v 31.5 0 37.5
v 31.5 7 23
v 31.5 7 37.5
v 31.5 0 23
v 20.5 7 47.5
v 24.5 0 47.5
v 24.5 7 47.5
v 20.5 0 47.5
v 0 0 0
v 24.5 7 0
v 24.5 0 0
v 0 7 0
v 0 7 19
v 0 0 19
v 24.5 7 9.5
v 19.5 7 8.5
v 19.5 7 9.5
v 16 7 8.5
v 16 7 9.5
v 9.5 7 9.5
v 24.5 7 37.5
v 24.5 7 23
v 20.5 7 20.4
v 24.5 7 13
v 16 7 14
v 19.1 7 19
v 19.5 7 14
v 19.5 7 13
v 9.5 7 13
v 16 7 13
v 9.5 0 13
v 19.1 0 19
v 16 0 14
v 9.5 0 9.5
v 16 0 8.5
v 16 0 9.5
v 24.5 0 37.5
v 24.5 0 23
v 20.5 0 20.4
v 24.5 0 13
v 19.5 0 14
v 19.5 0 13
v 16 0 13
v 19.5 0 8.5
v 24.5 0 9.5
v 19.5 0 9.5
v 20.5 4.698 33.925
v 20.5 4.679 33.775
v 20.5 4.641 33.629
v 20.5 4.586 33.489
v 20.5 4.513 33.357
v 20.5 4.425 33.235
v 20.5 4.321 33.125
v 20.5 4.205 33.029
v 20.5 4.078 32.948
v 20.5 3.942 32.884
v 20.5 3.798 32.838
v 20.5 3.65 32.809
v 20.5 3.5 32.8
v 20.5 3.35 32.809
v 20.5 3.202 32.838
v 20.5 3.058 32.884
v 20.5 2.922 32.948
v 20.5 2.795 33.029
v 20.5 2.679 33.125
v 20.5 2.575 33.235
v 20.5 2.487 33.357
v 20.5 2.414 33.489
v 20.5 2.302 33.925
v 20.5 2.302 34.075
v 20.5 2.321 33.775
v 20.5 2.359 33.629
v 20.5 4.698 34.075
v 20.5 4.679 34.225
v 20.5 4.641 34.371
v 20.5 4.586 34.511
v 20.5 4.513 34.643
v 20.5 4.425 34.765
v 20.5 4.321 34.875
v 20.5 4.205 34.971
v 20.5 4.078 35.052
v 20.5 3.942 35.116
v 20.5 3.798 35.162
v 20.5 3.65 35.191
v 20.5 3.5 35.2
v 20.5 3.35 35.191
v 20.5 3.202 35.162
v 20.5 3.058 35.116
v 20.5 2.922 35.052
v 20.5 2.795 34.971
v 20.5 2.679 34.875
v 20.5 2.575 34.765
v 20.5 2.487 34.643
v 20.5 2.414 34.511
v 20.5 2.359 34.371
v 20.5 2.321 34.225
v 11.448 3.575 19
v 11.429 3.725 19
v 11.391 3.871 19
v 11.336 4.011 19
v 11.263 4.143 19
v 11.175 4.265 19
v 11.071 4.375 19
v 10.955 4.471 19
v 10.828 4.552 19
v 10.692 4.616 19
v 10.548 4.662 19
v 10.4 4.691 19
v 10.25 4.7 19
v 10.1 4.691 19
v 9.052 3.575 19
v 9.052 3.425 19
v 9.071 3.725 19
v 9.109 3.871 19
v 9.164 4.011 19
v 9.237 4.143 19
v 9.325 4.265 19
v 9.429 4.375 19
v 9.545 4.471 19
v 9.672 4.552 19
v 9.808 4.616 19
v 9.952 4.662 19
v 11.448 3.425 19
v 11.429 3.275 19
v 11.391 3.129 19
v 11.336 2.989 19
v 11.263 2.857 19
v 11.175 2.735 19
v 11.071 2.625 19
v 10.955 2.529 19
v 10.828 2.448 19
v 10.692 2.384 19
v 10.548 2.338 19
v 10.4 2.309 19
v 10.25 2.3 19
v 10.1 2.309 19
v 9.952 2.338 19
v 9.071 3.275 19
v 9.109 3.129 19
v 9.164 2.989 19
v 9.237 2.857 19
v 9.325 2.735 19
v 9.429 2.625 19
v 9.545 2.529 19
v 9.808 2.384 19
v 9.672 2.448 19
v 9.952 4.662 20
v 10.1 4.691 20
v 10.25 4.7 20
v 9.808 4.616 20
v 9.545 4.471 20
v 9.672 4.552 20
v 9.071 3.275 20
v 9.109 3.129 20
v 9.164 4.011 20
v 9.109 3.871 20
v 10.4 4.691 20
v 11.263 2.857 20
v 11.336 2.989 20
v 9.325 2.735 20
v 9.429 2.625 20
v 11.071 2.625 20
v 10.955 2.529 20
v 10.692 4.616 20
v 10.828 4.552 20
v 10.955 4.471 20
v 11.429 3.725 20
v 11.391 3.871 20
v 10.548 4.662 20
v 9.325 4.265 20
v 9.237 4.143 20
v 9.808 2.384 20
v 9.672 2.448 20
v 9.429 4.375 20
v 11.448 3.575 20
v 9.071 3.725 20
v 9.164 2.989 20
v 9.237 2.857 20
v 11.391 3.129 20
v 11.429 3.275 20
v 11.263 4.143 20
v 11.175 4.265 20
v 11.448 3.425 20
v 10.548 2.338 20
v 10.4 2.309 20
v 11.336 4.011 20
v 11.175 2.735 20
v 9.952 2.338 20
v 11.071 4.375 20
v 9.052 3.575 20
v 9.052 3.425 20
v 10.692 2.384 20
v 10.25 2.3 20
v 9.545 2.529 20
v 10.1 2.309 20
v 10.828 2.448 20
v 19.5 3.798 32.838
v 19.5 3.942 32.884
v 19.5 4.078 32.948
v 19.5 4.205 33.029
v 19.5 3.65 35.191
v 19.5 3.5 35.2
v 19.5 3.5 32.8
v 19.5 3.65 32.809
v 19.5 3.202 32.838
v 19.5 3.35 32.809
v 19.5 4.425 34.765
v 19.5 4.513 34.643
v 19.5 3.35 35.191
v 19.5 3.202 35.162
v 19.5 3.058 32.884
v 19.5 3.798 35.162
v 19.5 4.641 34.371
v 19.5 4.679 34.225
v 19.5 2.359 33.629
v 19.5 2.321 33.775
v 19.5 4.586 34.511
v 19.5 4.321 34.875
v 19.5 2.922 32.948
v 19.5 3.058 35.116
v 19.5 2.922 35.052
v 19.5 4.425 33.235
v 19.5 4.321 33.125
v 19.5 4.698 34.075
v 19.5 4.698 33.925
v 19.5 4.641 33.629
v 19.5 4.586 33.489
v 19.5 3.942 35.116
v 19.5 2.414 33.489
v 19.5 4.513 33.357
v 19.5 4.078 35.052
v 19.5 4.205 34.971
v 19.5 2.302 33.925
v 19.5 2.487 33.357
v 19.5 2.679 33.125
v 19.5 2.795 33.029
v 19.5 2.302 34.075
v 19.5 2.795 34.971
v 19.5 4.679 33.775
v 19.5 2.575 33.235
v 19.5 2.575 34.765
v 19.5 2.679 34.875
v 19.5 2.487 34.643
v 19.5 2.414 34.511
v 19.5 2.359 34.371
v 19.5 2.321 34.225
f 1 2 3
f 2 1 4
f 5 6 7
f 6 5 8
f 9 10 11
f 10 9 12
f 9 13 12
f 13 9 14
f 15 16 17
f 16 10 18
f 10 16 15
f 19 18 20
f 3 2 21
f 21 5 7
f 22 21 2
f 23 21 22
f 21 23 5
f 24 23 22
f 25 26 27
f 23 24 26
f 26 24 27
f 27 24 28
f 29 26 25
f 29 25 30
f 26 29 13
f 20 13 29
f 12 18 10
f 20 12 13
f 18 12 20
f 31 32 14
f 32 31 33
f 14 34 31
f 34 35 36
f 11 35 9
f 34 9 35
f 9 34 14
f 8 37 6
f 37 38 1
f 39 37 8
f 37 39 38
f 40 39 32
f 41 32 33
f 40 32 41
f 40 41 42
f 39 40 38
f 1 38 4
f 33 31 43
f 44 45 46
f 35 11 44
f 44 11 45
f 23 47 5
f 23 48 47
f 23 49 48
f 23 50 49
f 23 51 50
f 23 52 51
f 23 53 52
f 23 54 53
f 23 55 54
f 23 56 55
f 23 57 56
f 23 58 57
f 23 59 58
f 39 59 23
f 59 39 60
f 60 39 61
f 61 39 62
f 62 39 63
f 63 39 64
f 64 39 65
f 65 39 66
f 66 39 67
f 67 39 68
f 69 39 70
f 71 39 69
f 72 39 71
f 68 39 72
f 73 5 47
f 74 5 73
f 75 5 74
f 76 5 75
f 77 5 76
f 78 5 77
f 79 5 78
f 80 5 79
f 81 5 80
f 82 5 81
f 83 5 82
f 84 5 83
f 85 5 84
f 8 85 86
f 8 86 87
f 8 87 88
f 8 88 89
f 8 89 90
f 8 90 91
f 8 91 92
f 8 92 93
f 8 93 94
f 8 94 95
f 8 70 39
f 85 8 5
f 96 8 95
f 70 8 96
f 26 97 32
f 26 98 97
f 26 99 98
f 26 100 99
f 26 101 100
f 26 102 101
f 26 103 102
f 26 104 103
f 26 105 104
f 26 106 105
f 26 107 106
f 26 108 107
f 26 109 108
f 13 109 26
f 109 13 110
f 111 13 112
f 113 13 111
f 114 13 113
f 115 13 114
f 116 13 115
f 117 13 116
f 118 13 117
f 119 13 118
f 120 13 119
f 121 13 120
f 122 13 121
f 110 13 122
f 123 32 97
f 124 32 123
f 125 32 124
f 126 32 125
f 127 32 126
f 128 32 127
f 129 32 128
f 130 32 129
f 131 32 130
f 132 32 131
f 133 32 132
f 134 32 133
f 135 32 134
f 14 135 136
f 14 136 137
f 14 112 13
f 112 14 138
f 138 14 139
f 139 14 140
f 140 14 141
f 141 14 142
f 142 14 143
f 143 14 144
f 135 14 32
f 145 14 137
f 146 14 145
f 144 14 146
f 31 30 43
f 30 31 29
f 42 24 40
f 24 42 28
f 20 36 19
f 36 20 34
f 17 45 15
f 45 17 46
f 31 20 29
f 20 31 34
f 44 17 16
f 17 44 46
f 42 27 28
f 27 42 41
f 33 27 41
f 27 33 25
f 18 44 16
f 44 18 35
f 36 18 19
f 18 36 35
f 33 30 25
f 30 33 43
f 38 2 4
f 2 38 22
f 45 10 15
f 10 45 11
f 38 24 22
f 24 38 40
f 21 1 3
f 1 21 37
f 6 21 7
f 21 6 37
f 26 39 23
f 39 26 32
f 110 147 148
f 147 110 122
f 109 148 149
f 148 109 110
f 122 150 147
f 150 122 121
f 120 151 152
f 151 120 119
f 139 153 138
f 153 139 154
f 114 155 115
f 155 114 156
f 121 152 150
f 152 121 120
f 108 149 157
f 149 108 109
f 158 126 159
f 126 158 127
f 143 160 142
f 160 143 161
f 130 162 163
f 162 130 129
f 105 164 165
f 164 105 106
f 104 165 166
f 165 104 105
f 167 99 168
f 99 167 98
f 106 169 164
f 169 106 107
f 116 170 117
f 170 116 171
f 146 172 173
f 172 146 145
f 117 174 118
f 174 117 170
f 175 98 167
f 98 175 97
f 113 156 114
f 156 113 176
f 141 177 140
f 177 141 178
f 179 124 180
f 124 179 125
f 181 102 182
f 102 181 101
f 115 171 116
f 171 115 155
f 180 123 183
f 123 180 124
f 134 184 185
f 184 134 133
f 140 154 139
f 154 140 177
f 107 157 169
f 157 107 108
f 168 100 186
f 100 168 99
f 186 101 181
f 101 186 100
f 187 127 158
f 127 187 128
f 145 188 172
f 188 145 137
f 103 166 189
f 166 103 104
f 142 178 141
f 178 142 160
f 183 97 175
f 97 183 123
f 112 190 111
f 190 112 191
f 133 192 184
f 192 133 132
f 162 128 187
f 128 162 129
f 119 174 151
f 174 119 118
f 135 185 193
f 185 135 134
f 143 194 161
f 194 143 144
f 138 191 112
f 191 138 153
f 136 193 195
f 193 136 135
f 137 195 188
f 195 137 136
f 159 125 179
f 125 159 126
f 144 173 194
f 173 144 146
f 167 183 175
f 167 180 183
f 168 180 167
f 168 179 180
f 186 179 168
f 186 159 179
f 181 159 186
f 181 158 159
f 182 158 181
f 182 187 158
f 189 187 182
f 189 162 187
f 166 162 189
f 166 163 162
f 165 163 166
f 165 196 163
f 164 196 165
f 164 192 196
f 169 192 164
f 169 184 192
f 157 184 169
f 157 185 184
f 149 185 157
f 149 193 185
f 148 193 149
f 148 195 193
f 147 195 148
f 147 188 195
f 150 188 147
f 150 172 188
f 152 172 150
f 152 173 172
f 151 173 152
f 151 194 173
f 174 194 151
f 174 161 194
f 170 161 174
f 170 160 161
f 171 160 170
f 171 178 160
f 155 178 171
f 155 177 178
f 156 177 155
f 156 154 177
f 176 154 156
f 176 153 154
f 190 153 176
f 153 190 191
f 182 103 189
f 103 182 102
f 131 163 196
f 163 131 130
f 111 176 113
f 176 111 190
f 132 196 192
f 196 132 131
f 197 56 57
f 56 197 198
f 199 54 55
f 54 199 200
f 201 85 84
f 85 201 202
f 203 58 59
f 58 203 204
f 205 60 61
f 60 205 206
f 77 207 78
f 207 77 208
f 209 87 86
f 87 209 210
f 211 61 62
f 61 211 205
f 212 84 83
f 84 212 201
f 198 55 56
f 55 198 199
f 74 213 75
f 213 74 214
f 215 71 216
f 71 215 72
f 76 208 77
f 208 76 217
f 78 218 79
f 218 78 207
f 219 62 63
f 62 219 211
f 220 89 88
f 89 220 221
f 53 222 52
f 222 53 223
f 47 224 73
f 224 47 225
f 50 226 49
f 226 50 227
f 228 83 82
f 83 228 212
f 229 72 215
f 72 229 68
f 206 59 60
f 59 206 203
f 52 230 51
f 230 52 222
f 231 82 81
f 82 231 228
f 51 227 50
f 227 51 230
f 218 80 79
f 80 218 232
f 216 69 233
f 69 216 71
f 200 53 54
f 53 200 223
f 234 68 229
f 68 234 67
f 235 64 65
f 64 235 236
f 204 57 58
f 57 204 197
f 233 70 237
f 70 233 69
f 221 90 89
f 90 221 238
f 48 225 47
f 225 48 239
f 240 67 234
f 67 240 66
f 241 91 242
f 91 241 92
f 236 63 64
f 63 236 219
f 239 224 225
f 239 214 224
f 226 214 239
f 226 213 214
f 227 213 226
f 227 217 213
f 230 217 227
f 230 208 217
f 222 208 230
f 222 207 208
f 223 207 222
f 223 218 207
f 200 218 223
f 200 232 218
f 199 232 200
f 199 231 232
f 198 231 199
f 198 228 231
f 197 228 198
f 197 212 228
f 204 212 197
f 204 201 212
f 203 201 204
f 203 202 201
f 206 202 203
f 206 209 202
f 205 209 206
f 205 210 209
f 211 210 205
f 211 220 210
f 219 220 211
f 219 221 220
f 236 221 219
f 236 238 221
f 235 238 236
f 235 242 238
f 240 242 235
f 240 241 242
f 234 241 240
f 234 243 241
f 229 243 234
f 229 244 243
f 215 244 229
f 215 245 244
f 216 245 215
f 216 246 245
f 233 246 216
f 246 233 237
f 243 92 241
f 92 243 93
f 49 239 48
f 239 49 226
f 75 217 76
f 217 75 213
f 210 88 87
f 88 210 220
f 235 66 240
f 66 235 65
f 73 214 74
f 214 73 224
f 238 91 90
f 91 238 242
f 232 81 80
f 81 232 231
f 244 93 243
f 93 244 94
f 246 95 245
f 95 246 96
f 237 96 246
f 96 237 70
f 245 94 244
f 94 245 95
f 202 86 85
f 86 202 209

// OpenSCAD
//This differs from the original mount by spacing of 2mm for acoustic washers and locating pins for them
difference(){//overall size
translate([0,0,0])cube ([24.5+7,7,21+14.5+12]);
translate([-1,-1,19])cube ([21.5,9,31]);
translate([9.5,-1,9.5])cube ([16,9,3.5]);
translate([16,-1,8.5])cube ([3.5,9,5.5]);
translate([24.5,-1,-1])cube ([8,9,24]);
translate([24.5,-1,37.5])cube ([8,9,12]);
}
difference(){
translate([19.1,0,19])//corner reinforcement
    rotate ([0,45,0]) cube ([2,7,2]);
}
difference(){
translate([20.5/2,3.5,19])//acoustic washer locatin pin
    rotate(a=[0,0,90])cylinder(r=1.2,h=1,$fn=50);
}
difference(){
translate([19.5,3.5,34])//acoustic washer locatin pin
    rotate(a=[0,90,0])cylinder(r=1.2,h=1,$fn=50);
}
